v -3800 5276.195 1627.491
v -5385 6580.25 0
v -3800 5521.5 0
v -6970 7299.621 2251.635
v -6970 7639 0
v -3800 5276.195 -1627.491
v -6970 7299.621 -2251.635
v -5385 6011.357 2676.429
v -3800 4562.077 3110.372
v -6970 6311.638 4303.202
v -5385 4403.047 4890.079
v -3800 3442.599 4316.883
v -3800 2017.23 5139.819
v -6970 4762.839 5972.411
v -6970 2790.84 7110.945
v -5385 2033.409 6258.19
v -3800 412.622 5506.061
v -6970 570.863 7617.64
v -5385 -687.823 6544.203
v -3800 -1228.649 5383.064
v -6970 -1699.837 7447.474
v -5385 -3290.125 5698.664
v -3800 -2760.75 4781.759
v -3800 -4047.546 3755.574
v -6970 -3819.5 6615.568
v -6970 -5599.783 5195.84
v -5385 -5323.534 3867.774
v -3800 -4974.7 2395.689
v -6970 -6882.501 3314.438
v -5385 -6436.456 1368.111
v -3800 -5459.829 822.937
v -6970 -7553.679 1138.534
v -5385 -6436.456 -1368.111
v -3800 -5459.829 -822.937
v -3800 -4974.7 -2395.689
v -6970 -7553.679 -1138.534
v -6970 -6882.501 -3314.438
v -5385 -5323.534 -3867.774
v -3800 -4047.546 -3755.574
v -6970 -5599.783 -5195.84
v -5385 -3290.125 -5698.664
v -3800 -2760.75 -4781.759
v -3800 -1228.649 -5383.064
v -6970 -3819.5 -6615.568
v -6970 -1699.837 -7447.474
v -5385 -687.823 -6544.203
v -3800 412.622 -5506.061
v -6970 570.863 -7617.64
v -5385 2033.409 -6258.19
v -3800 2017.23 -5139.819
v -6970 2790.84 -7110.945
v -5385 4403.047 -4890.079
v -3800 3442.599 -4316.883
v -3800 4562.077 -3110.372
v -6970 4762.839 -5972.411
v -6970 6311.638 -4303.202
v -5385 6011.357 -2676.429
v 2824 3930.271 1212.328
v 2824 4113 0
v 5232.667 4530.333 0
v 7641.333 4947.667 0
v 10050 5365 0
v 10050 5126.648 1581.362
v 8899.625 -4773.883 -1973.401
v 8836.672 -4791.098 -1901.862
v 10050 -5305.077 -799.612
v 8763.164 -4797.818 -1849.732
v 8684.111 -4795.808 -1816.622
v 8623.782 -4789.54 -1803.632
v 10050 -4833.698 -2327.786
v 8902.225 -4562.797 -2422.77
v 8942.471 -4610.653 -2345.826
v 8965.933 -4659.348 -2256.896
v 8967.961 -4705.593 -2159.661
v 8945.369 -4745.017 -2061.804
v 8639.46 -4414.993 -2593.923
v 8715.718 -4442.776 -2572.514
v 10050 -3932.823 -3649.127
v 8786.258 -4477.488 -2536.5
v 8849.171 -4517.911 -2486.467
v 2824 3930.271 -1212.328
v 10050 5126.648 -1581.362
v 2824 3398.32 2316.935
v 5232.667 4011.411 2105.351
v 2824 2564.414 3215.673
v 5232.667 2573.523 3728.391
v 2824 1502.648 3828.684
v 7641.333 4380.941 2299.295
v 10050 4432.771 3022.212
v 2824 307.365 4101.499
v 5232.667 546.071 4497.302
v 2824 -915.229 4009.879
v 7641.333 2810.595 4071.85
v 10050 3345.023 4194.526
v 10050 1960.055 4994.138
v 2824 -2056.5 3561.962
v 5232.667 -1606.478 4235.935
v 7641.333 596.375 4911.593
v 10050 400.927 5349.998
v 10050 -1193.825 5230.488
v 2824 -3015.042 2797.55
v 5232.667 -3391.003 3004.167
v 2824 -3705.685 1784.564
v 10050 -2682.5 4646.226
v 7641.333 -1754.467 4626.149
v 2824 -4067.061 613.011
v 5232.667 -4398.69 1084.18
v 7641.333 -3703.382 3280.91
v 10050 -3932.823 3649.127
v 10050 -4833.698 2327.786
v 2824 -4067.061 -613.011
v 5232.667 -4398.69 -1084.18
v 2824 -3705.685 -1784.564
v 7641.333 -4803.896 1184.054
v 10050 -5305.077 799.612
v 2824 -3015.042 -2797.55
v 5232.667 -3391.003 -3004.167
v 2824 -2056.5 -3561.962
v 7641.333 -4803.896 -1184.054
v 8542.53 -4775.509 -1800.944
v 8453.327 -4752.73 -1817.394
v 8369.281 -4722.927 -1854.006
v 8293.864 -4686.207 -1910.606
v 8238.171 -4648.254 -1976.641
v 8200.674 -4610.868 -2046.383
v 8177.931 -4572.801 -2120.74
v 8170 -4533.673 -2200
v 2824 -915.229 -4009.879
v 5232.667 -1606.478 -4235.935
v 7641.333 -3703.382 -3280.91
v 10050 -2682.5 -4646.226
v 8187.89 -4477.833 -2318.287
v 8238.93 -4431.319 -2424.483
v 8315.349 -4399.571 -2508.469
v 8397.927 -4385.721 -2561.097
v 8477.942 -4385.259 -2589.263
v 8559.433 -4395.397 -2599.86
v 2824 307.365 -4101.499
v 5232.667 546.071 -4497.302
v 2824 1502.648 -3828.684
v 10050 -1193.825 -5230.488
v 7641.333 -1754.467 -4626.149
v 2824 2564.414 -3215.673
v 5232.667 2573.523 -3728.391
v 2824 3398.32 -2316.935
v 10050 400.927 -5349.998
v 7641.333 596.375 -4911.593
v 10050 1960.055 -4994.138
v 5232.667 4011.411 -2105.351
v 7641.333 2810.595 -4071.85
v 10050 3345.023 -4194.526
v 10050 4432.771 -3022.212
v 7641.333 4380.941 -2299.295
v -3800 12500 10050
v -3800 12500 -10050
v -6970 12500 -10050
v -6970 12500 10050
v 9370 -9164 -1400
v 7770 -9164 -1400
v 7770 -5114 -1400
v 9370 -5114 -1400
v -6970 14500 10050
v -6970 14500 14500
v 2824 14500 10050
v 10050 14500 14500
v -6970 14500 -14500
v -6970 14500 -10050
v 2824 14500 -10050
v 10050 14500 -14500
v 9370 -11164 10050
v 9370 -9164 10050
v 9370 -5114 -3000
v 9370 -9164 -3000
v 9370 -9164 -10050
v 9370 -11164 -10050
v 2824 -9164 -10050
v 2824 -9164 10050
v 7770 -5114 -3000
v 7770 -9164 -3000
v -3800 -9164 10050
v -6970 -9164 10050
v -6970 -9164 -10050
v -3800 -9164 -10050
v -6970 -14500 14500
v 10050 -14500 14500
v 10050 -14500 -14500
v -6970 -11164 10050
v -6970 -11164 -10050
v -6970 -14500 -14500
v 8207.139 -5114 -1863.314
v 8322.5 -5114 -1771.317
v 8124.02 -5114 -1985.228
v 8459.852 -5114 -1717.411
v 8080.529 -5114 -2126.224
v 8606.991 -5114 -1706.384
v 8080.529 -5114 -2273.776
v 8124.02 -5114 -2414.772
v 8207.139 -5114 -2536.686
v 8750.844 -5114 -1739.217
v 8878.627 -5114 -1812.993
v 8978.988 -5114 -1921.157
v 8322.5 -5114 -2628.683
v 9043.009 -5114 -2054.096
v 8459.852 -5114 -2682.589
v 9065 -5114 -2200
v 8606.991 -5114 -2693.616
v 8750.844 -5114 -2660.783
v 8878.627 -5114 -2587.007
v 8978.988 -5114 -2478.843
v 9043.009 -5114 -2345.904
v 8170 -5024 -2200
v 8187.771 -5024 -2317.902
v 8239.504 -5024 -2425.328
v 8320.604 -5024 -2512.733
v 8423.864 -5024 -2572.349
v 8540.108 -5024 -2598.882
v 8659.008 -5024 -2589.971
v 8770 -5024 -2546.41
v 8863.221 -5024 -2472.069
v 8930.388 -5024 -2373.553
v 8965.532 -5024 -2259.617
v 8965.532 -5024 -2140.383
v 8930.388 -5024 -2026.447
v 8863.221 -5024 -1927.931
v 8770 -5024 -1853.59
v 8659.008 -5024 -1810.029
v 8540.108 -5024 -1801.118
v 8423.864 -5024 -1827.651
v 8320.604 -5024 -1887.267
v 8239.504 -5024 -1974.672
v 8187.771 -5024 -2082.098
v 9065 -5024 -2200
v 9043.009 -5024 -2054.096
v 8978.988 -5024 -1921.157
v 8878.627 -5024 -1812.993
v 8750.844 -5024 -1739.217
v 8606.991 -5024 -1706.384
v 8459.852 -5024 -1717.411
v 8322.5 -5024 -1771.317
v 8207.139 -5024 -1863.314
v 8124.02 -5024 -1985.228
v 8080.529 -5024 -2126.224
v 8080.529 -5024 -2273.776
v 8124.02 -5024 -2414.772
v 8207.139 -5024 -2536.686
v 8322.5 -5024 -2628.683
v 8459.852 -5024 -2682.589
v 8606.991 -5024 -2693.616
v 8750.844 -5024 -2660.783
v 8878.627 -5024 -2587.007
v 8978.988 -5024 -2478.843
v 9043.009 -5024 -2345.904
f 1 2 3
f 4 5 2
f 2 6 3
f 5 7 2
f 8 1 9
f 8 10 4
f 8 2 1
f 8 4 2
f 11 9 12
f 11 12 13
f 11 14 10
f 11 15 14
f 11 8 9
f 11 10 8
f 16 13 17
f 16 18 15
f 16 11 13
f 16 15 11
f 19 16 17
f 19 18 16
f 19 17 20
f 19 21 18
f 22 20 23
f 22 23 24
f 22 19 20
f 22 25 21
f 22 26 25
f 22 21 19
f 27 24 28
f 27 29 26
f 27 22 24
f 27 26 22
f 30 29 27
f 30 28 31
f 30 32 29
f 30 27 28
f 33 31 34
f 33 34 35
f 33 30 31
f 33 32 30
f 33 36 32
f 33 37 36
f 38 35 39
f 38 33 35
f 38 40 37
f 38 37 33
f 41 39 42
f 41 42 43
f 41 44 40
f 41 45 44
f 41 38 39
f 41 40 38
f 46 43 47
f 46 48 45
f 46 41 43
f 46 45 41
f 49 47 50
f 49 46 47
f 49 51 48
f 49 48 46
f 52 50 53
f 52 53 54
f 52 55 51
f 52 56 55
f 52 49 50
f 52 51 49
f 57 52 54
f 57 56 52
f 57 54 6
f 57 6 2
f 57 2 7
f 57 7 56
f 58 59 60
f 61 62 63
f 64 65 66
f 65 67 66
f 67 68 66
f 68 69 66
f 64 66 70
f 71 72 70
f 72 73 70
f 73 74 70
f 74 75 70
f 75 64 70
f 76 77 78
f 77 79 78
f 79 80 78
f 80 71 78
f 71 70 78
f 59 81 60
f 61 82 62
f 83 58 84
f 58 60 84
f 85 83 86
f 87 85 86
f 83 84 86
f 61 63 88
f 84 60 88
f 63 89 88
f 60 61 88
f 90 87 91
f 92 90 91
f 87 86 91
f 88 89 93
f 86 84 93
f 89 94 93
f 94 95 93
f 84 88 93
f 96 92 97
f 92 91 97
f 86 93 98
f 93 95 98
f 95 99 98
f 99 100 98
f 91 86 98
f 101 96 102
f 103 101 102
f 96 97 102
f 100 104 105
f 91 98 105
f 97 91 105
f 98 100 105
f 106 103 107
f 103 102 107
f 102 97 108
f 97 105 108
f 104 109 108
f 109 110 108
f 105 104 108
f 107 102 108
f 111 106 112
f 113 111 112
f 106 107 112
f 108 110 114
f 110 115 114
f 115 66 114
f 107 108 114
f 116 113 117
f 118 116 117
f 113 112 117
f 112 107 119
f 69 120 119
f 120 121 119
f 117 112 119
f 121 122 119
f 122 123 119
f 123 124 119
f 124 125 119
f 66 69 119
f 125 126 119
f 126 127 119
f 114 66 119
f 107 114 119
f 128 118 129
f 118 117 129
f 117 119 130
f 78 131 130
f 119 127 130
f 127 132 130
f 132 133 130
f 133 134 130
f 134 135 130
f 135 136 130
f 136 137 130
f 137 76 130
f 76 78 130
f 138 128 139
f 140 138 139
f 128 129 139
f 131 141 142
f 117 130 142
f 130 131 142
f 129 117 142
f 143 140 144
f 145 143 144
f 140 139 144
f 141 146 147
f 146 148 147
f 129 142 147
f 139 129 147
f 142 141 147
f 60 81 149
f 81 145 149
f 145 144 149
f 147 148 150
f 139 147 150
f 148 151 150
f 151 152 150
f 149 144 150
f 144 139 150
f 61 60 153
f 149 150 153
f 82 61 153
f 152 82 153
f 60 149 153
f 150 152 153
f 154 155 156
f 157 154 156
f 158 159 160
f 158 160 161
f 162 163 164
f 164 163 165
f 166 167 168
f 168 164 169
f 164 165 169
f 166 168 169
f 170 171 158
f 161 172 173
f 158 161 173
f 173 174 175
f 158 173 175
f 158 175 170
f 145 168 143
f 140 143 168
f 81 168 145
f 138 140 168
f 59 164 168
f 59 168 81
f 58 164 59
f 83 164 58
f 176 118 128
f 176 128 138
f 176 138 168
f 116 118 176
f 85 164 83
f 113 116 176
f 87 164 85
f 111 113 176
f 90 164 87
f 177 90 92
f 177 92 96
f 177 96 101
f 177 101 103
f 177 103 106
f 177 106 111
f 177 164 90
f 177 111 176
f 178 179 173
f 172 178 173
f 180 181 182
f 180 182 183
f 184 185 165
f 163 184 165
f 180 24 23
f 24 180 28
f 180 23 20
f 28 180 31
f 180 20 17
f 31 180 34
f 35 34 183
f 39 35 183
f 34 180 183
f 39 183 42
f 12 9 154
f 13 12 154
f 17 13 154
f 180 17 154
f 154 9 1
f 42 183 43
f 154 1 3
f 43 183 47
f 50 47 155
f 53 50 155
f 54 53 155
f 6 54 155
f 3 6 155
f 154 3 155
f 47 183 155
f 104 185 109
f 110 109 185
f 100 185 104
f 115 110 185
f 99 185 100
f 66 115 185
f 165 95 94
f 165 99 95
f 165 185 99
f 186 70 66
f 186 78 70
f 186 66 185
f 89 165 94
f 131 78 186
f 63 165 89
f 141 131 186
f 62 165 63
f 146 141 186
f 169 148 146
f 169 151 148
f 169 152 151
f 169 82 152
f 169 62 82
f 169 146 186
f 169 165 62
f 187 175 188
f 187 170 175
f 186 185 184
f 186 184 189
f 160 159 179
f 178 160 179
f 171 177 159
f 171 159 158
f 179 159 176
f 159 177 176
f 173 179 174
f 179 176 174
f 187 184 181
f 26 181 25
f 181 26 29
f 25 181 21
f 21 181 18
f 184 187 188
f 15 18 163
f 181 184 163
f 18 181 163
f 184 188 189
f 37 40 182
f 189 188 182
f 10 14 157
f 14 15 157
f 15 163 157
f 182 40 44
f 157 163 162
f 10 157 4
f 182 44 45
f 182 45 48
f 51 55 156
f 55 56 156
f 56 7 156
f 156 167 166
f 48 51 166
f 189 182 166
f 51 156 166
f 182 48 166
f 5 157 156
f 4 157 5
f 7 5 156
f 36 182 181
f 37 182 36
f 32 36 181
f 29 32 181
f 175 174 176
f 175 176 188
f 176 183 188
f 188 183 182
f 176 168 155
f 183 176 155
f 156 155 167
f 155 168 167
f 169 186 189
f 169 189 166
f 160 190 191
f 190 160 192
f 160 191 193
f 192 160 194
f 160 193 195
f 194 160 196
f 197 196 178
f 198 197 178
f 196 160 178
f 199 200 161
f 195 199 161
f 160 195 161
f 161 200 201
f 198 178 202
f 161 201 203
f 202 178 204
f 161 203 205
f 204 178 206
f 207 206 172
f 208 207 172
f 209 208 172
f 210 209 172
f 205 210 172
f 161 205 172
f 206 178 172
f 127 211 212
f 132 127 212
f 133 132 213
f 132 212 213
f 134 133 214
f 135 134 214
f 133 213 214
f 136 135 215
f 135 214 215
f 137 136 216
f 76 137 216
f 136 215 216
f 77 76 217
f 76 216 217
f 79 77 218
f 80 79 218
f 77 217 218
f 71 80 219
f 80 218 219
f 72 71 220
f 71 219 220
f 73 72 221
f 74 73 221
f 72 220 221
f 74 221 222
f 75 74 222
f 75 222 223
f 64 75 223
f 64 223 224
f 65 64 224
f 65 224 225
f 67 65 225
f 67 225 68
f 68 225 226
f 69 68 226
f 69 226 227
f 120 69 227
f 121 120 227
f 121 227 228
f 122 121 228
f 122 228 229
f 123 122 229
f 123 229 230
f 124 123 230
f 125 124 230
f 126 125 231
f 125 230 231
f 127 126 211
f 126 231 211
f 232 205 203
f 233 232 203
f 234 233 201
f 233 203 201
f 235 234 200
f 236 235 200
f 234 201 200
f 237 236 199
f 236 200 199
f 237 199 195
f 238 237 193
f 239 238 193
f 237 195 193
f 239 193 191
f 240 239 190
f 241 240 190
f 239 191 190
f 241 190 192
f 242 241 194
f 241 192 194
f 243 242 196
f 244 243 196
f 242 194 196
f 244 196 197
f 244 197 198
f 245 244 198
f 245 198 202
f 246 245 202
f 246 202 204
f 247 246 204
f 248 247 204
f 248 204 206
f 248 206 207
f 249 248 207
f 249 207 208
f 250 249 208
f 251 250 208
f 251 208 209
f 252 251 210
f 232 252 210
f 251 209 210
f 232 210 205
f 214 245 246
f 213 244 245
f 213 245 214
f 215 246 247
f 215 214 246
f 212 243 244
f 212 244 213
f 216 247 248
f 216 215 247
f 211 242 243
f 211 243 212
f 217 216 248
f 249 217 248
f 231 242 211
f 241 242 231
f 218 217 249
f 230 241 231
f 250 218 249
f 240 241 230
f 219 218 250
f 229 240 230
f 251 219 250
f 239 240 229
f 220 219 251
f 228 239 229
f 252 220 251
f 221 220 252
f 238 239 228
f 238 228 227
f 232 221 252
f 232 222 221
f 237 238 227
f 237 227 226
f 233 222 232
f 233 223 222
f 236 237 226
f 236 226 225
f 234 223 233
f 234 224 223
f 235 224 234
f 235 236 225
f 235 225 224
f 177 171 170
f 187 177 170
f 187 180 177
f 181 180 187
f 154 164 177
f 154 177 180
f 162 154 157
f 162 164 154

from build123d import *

# Parameters (mm, degrees)
ESBO_O1_W                     = 29000
ESBO_O1_H                     = 29000
RESSALTO_EXTRUS_O1_DEPTH      = 10050
RESSALTO_EXTRUS_O1_DEPTH_BACK = 6970
CORTE_EXTRUS_O1_DEPTH         = 10050
CORTE_EXTRUS_O1_DEPTH_BACK    = 10050
ESBO_O4_W                     = 1600
ESBO_O4_H                     = 1600
CORTE_EXTRUS_O2_DEPTH         = 6050
CORTE_EXTRUS_O3_REACH         = 19616
ESBO_O5_R                     = 400
ESBO_O8_R                     = 495
CORTE_EXTRUS_O4_DEPTH         = 90


with BuildPart() as part:
    # Esboço1 → Ressalto-extrusão1 (new body, two sides)
    with BuildSketch(Plane(origin=(0, 0, 0), x_dir=(0, 0, -1), z_dir=(1, 0, 0))) as ressalto_extrus_o1_sk:
        Rectangle(ESBO_O1_W, ESBO_O1_H)
    extrude(amount=RESSALTO_EXTRUS_O1_DEPTH)
    extrude(ressalto_extrus_o1_sk.sketch, amount=-RESSALTO_EXTRUS_O1_DEPTH_BACK)

    # Esboço2 → Corte-Revolução1 (revolve, cut)
    with BuildSketch(Plane.XY):
        Polygon((2824, 4113), (10050, 5365), (10050, 0), (2824, 0), align=None)
        Polygon((-3800, 5521.5), (-6970, 7639), (-6970, 0), (-3800, 0), align=None)
    revolve(axis=Axis((0, 0, 0), (1, 0, 0)), mode=Mode.SUBTRACT)

    # Esboço3 → Corte-extrusão1 (cut, two sides)
    with BuildSketch(Plane.XY) as corte_extrus_o1_sk:
        Polygon((-3800, -9164), (-3800, 12500), (-6970, 12500), (-6970, 14500), (2824, 14500), (2824, -9164), (9370, -9164), (9370, -11164), (-6970, -11164), (-6970, -9164), align=None)
    extrude(amount=CORTE_EXTRUS_O1_DEPTH, mode=Mode.SUBTRACT)
    extrude(corte_extrus_o1_sk.sketch, amount=-CORTE_EXTRUS_O1_DEPTH_BACK, mode=Mode.SUBTRACT)

    # Esboço4 → Corte-extrusão2 (cut)
    with BuildSketch(Plane(origin=(0, -11164, 0), x_dir=(1, 0, 0), z_dir=(0, 1, 0))):
        with Locations((8570, 2200)):
            Rectangle(ESBO_O4_W, ESBO_O4_H)
    extrude(amount=CORTE_EXTRUS_O2_DEPTH, mode=Mode.SUBTRACT)

    # Esboço5 → Corte-extrusão3 (cut, up to next)
    with BuildSketch(Plane(origin=(0, -5114, 0), x_dir=(-1, 0, 0), z_dir=(0, -1, 0)), mode=Mode.PRIVATE) as corte_extrus_o3_sk1:
        with Locations((-8570, 2200)):
            Circle(ESBO_O5_R)
    corte_extrus_o3_tool1 = extrude(corte_extrus_o3_sk1.sketch, amount=-CORTE_EXTRUS_O3_REACH, mode=Mode.PRIVATE) & part.part
    add(corte_extrus_o3_tool1.solids().sort_by_distance((8570, -5114, -2200))[0], mode=Mode.SUBTRACT)

    # Esboço8 → Corte-extrusão4 (cut)
    with BuildSketch(Plane.XZ.offset(5114)):
        with Locations((8570, -2200)):
            Circle(ESBO_O8_R)
    extrude(amount=-CORTE_EXTRUS_O4_DEPTH, mode=Mode.SUBTRACT)


solid = part.part
